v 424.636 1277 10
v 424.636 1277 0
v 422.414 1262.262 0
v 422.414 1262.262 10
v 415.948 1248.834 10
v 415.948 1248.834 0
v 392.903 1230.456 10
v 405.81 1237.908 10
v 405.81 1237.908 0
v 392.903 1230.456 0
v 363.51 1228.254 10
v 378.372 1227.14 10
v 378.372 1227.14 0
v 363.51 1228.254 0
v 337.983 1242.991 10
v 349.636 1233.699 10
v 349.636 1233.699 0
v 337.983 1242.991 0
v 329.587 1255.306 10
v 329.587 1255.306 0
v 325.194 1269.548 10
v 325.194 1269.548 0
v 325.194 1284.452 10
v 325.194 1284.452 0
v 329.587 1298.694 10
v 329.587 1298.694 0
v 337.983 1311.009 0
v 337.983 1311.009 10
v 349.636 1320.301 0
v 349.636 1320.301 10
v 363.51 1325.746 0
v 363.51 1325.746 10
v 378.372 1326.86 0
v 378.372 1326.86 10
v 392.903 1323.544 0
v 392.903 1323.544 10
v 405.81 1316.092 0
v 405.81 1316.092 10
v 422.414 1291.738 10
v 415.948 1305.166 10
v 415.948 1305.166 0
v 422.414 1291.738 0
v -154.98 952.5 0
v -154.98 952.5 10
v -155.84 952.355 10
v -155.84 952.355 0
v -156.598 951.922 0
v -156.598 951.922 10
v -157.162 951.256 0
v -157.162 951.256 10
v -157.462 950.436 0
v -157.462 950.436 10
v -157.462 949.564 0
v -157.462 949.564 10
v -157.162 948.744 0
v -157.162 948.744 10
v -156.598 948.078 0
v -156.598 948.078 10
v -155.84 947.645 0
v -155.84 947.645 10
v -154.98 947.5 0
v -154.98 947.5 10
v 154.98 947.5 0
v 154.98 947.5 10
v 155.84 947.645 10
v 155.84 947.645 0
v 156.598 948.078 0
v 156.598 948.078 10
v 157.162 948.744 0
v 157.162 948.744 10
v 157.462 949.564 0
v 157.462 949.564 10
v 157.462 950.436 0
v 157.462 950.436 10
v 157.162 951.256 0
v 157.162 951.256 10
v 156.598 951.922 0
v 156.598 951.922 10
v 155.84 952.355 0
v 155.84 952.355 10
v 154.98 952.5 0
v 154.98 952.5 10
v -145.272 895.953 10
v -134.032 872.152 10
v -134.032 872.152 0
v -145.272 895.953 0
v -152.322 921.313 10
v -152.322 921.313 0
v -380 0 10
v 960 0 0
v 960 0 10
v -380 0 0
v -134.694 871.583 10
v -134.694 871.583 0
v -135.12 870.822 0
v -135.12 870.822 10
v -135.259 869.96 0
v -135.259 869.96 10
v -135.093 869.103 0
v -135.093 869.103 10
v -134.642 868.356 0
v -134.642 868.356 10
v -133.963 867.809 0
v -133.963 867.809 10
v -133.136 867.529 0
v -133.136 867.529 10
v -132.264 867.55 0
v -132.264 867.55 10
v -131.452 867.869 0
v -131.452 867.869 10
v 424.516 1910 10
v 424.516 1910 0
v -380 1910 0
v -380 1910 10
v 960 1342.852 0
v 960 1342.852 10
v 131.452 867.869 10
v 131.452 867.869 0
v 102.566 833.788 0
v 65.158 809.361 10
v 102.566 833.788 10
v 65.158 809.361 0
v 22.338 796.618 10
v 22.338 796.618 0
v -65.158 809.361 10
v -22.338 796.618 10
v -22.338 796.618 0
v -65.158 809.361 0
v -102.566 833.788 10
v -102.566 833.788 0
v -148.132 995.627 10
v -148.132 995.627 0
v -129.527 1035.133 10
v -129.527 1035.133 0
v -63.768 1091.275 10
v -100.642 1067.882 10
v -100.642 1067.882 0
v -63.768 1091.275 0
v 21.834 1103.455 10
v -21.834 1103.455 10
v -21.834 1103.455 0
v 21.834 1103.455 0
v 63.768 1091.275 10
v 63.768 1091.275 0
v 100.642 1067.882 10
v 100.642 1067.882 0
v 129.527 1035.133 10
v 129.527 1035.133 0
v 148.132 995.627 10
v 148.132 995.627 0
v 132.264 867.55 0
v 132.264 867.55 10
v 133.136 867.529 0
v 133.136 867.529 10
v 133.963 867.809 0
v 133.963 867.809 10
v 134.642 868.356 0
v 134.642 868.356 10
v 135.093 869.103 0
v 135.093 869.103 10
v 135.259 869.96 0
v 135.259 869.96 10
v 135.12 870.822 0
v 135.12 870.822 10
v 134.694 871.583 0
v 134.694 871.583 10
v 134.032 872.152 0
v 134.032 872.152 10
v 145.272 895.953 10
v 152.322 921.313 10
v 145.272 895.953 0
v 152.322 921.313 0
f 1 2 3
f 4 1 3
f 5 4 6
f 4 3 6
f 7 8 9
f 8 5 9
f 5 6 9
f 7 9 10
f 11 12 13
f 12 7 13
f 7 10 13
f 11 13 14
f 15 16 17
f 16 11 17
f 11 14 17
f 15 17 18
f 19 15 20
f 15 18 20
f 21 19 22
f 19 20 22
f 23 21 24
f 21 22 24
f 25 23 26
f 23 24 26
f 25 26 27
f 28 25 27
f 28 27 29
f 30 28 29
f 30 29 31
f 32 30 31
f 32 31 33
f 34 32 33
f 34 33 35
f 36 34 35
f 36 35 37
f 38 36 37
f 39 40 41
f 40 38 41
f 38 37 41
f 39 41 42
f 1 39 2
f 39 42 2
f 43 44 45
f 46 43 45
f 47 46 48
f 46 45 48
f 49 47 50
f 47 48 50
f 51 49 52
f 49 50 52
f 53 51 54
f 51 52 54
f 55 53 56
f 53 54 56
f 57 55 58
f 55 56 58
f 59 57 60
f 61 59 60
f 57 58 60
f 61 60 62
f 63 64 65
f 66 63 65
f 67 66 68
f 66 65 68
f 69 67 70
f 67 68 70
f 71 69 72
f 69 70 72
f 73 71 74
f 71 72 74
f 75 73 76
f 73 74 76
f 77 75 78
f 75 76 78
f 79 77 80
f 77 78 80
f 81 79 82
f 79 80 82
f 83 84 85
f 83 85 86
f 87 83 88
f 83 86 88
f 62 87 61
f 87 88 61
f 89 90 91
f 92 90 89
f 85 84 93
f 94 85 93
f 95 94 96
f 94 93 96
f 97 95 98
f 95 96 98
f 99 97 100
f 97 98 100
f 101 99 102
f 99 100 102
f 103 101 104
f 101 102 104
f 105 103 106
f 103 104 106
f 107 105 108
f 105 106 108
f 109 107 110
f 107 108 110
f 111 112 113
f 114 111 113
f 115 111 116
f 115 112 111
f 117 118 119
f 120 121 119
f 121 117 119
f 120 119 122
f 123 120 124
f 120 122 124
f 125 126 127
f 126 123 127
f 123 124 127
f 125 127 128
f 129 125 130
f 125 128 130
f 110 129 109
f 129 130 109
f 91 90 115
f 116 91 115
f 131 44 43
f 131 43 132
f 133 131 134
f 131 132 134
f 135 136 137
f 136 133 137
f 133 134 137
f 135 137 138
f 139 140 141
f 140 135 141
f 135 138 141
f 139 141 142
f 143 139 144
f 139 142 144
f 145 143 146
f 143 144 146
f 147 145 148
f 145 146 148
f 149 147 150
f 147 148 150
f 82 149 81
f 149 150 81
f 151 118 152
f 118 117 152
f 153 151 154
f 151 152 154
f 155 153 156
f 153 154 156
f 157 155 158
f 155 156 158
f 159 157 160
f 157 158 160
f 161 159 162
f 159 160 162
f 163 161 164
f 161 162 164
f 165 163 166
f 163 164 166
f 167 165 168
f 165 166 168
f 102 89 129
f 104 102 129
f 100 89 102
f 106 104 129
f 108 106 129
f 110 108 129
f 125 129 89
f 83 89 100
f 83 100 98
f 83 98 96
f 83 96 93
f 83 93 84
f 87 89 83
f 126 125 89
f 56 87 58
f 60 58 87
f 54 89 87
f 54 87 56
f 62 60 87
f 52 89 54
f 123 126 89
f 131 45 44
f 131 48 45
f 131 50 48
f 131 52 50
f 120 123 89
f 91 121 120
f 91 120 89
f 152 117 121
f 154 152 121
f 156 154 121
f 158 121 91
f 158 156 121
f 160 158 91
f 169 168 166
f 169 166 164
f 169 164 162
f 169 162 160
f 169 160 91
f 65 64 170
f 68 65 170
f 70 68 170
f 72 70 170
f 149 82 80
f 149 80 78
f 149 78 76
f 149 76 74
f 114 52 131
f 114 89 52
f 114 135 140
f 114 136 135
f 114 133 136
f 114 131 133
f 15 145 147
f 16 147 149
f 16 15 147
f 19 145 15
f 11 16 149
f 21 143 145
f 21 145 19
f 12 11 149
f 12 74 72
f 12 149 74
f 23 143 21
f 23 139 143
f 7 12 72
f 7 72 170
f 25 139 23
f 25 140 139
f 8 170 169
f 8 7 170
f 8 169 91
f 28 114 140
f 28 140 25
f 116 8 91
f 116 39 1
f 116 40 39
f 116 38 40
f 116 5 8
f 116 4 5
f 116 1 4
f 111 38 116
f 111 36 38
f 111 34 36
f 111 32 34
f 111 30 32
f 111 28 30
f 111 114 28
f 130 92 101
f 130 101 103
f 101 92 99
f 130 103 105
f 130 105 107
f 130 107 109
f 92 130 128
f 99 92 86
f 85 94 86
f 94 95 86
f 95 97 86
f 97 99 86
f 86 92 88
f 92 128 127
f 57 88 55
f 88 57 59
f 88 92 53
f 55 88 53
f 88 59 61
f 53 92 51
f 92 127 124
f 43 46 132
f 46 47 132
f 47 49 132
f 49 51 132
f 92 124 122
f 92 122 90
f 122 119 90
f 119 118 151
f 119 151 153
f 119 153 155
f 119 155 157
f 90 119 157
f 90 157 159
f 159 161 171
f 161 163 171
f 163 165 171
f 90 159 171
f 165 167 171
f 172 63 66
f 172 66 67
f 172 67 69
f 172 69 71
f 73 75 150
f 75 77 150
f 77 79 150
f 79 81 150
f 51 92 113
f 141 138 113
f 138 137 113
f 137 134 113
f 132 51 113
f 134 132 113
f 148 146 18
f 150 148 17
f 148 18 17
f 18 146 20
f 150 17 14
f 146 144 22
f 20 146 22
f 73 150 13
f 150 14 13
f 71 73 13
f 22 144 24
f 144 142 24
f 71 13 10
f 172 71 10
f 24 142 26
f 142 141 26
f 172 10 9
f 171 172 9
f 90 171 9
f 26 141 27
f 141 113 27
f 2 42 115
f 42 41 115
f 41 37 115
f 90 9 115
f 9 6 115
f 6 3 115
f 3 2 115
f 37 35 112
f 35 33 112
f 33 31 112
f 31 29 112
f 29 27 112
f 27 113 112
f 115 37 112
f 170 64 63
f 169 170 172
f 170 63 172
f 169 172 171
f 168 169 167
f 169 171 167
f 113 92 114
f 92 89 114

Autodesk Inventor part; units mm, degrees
ref_plane "YZ Plane" through (0, 0, 0) normal (1, 0, 0) x (0, 1, 0)
ref_plane "XZ Plane" through (0, 0, 0) normal (0, 1, 0) x (-1, 0, 0)
ref_plane "XY Plane" through (0, 0, 0) normal (0, 0, 1) x (1, 0, 0)
sketch "Sketch1" plane through (0, 0, 0) normal (0, 0, 1) x (1, 0, 0)
  line L0 (0, 0) -> (0, 1910) construction
  line L1 (424.5155, 1910) -> (-415.4845, 1910)
  line L2 (-415.4845, 1910) -> (-1180, 1150)
  line L3 (-1180, 0) -> (-1180, 1150)
  line L4 (960, 0) -> (960, 1342.8524)
  line L5 (424.5155, 1910) -> (960, 1342.8524)
  circle A0 centre (0, 950) radius 195 construction
  line L6 (960, 0) -> (-1180, 0)
  circle A1 centre (-960, 220) radius 200
  circle A2 centre (-588, 255) radius 38
  circle A3 centre (374.6358, 1277) radius 50
  circle A4 centre (0, 950) radius 155
  point P0 (0, 955)
  dimension "d1" = 840
  dimension "d3" = 1150
  dimension "d11" = 390
  dimension "d12" = 1180
  dimension "d13" = 950
  dimension "d14" = 76
  dimension "d15" = 1910
  dimension "d16" = 255
  dimension "d17" = 220
  dimension "d18" = 400
  dimension "d19" = 220
  dimension "d21" = 1277
  dimension "d22" = 1554.6358
  dimension "d23" = 100
  dimension "d33" = 2140
  dimension "d34" = 494
  dimension "d45" = 310
  dimension "d49" = 372
  dimension "d51" = 780
  dimension "d52" = 1078
extrude "Extrusion1" add sketch "Sketch1" along normal blind 10
sketch "Sketch3" plane through (0, 0, 10) normal (0, 0, 1) x (1, 0, 0)
  line L0 (-400, 950) -> (400, 950) construction
  circle A0 centre (0, 950) radius 155 projected
  circle A1 centre (155, 950) radius 2.5
  circle A2 centre (-155, 950) radius 2.5
  line L1 (132.7592, 870) -> (-132.7592, 870) construction
  circle A3 centre (132.7592, 870) radius 2.5
  circle A4 centre (-132.7592, 870) radius 2.5
  point P0 (0, 0)
  point P1 (-154.9798, 947.5001)
  point P2 (-154.9798, 952.4999)
  point P3 (154.9798, 947.5001)
  point P4 (154.9798, 952.4999)
  point P5 (134.0322, 872.1516)
  point P6 (131.4516, 867.8692)
  dimension "d47" = 5
  dimension "d48" = 80
extrude "Extrusion3" cut sketch "Sketch3" against normal through all contours A0 A1 | A0 A2 | A3 A0 | A4 A0 | A0 A4 picked at (155.7492, 949.3589) picked at (-155.8257, 950.101) picked at (133.5004, 869.6223)
sketch "Sketch4" plane through (0, 0, 10) normal (0, 0, 1) x (1, 0, 0)
  arc A0 (154.9798, 947.5001) -> (154.9798, 952.4999) centre (155, 950) ccw projected
  arc A1 (134.0322, 872.1516) -> (154.9798, 947.5001) centre (0, 950) ccw projected
  arc A2 (131.4516, 867.8692) -> (134.0322, 872.1516) centre (132.7592, 870) ccw projected
  arc A3 (-131.4516, 867.8692) -> (131.4516, 867.8692) centre (0, 950) ccw projected
  arc A4 (-134.0322, 872.1516) -> (-131.4516, 867.8692) centre (-132.7592, 870) ccw projected
  arc A5 (-154.9798, 947.5001) -> (-134.0322, 872.1516) centre (0, 950) ccw projected
  arc A6 (-154.9798, 952.4999) -> (-154.9798, 947.5001) centre (-155, 950) ccw projected
  arc A7 (154.9798, 952.4999) -> (-154.9798, 952.4999) centre (0, 950) ccw projected
  line L0 (960, 1342.8524) -> (424.5155, 1910) projected
  line L1 (424.5155, 1910) -> (-415.4845, 1910) projected
  line L2 (-415.4845, 1910) -> (-1180, 1150) projected
  line L3 (-1180, 1150) -> (-1180, 0) projected
  line L4 (-1180, 0) -> (960, 0) projected
  line L5 (960, 0) -> (960, 1342.8524) projected
  circle A8 centre (374.6358, 1277) radius 50 projected
  circle A9 centre (-588, 255) radius 38 projected
  circle A10 centre (-960, 220) radius 200 projected
  line L6 (-380, 0) -> (-380, 1910)
  point P0 (0, 0)
  dimension "d53" = 1340
extrude "Extrusion4" cut sketch "Sketch4" against normal through all contours L6 L4 L3 L2 L1
equation "\"d17\" = d19"
properties part number "ДМФ 015 Стенка Нос ПРАВ"
